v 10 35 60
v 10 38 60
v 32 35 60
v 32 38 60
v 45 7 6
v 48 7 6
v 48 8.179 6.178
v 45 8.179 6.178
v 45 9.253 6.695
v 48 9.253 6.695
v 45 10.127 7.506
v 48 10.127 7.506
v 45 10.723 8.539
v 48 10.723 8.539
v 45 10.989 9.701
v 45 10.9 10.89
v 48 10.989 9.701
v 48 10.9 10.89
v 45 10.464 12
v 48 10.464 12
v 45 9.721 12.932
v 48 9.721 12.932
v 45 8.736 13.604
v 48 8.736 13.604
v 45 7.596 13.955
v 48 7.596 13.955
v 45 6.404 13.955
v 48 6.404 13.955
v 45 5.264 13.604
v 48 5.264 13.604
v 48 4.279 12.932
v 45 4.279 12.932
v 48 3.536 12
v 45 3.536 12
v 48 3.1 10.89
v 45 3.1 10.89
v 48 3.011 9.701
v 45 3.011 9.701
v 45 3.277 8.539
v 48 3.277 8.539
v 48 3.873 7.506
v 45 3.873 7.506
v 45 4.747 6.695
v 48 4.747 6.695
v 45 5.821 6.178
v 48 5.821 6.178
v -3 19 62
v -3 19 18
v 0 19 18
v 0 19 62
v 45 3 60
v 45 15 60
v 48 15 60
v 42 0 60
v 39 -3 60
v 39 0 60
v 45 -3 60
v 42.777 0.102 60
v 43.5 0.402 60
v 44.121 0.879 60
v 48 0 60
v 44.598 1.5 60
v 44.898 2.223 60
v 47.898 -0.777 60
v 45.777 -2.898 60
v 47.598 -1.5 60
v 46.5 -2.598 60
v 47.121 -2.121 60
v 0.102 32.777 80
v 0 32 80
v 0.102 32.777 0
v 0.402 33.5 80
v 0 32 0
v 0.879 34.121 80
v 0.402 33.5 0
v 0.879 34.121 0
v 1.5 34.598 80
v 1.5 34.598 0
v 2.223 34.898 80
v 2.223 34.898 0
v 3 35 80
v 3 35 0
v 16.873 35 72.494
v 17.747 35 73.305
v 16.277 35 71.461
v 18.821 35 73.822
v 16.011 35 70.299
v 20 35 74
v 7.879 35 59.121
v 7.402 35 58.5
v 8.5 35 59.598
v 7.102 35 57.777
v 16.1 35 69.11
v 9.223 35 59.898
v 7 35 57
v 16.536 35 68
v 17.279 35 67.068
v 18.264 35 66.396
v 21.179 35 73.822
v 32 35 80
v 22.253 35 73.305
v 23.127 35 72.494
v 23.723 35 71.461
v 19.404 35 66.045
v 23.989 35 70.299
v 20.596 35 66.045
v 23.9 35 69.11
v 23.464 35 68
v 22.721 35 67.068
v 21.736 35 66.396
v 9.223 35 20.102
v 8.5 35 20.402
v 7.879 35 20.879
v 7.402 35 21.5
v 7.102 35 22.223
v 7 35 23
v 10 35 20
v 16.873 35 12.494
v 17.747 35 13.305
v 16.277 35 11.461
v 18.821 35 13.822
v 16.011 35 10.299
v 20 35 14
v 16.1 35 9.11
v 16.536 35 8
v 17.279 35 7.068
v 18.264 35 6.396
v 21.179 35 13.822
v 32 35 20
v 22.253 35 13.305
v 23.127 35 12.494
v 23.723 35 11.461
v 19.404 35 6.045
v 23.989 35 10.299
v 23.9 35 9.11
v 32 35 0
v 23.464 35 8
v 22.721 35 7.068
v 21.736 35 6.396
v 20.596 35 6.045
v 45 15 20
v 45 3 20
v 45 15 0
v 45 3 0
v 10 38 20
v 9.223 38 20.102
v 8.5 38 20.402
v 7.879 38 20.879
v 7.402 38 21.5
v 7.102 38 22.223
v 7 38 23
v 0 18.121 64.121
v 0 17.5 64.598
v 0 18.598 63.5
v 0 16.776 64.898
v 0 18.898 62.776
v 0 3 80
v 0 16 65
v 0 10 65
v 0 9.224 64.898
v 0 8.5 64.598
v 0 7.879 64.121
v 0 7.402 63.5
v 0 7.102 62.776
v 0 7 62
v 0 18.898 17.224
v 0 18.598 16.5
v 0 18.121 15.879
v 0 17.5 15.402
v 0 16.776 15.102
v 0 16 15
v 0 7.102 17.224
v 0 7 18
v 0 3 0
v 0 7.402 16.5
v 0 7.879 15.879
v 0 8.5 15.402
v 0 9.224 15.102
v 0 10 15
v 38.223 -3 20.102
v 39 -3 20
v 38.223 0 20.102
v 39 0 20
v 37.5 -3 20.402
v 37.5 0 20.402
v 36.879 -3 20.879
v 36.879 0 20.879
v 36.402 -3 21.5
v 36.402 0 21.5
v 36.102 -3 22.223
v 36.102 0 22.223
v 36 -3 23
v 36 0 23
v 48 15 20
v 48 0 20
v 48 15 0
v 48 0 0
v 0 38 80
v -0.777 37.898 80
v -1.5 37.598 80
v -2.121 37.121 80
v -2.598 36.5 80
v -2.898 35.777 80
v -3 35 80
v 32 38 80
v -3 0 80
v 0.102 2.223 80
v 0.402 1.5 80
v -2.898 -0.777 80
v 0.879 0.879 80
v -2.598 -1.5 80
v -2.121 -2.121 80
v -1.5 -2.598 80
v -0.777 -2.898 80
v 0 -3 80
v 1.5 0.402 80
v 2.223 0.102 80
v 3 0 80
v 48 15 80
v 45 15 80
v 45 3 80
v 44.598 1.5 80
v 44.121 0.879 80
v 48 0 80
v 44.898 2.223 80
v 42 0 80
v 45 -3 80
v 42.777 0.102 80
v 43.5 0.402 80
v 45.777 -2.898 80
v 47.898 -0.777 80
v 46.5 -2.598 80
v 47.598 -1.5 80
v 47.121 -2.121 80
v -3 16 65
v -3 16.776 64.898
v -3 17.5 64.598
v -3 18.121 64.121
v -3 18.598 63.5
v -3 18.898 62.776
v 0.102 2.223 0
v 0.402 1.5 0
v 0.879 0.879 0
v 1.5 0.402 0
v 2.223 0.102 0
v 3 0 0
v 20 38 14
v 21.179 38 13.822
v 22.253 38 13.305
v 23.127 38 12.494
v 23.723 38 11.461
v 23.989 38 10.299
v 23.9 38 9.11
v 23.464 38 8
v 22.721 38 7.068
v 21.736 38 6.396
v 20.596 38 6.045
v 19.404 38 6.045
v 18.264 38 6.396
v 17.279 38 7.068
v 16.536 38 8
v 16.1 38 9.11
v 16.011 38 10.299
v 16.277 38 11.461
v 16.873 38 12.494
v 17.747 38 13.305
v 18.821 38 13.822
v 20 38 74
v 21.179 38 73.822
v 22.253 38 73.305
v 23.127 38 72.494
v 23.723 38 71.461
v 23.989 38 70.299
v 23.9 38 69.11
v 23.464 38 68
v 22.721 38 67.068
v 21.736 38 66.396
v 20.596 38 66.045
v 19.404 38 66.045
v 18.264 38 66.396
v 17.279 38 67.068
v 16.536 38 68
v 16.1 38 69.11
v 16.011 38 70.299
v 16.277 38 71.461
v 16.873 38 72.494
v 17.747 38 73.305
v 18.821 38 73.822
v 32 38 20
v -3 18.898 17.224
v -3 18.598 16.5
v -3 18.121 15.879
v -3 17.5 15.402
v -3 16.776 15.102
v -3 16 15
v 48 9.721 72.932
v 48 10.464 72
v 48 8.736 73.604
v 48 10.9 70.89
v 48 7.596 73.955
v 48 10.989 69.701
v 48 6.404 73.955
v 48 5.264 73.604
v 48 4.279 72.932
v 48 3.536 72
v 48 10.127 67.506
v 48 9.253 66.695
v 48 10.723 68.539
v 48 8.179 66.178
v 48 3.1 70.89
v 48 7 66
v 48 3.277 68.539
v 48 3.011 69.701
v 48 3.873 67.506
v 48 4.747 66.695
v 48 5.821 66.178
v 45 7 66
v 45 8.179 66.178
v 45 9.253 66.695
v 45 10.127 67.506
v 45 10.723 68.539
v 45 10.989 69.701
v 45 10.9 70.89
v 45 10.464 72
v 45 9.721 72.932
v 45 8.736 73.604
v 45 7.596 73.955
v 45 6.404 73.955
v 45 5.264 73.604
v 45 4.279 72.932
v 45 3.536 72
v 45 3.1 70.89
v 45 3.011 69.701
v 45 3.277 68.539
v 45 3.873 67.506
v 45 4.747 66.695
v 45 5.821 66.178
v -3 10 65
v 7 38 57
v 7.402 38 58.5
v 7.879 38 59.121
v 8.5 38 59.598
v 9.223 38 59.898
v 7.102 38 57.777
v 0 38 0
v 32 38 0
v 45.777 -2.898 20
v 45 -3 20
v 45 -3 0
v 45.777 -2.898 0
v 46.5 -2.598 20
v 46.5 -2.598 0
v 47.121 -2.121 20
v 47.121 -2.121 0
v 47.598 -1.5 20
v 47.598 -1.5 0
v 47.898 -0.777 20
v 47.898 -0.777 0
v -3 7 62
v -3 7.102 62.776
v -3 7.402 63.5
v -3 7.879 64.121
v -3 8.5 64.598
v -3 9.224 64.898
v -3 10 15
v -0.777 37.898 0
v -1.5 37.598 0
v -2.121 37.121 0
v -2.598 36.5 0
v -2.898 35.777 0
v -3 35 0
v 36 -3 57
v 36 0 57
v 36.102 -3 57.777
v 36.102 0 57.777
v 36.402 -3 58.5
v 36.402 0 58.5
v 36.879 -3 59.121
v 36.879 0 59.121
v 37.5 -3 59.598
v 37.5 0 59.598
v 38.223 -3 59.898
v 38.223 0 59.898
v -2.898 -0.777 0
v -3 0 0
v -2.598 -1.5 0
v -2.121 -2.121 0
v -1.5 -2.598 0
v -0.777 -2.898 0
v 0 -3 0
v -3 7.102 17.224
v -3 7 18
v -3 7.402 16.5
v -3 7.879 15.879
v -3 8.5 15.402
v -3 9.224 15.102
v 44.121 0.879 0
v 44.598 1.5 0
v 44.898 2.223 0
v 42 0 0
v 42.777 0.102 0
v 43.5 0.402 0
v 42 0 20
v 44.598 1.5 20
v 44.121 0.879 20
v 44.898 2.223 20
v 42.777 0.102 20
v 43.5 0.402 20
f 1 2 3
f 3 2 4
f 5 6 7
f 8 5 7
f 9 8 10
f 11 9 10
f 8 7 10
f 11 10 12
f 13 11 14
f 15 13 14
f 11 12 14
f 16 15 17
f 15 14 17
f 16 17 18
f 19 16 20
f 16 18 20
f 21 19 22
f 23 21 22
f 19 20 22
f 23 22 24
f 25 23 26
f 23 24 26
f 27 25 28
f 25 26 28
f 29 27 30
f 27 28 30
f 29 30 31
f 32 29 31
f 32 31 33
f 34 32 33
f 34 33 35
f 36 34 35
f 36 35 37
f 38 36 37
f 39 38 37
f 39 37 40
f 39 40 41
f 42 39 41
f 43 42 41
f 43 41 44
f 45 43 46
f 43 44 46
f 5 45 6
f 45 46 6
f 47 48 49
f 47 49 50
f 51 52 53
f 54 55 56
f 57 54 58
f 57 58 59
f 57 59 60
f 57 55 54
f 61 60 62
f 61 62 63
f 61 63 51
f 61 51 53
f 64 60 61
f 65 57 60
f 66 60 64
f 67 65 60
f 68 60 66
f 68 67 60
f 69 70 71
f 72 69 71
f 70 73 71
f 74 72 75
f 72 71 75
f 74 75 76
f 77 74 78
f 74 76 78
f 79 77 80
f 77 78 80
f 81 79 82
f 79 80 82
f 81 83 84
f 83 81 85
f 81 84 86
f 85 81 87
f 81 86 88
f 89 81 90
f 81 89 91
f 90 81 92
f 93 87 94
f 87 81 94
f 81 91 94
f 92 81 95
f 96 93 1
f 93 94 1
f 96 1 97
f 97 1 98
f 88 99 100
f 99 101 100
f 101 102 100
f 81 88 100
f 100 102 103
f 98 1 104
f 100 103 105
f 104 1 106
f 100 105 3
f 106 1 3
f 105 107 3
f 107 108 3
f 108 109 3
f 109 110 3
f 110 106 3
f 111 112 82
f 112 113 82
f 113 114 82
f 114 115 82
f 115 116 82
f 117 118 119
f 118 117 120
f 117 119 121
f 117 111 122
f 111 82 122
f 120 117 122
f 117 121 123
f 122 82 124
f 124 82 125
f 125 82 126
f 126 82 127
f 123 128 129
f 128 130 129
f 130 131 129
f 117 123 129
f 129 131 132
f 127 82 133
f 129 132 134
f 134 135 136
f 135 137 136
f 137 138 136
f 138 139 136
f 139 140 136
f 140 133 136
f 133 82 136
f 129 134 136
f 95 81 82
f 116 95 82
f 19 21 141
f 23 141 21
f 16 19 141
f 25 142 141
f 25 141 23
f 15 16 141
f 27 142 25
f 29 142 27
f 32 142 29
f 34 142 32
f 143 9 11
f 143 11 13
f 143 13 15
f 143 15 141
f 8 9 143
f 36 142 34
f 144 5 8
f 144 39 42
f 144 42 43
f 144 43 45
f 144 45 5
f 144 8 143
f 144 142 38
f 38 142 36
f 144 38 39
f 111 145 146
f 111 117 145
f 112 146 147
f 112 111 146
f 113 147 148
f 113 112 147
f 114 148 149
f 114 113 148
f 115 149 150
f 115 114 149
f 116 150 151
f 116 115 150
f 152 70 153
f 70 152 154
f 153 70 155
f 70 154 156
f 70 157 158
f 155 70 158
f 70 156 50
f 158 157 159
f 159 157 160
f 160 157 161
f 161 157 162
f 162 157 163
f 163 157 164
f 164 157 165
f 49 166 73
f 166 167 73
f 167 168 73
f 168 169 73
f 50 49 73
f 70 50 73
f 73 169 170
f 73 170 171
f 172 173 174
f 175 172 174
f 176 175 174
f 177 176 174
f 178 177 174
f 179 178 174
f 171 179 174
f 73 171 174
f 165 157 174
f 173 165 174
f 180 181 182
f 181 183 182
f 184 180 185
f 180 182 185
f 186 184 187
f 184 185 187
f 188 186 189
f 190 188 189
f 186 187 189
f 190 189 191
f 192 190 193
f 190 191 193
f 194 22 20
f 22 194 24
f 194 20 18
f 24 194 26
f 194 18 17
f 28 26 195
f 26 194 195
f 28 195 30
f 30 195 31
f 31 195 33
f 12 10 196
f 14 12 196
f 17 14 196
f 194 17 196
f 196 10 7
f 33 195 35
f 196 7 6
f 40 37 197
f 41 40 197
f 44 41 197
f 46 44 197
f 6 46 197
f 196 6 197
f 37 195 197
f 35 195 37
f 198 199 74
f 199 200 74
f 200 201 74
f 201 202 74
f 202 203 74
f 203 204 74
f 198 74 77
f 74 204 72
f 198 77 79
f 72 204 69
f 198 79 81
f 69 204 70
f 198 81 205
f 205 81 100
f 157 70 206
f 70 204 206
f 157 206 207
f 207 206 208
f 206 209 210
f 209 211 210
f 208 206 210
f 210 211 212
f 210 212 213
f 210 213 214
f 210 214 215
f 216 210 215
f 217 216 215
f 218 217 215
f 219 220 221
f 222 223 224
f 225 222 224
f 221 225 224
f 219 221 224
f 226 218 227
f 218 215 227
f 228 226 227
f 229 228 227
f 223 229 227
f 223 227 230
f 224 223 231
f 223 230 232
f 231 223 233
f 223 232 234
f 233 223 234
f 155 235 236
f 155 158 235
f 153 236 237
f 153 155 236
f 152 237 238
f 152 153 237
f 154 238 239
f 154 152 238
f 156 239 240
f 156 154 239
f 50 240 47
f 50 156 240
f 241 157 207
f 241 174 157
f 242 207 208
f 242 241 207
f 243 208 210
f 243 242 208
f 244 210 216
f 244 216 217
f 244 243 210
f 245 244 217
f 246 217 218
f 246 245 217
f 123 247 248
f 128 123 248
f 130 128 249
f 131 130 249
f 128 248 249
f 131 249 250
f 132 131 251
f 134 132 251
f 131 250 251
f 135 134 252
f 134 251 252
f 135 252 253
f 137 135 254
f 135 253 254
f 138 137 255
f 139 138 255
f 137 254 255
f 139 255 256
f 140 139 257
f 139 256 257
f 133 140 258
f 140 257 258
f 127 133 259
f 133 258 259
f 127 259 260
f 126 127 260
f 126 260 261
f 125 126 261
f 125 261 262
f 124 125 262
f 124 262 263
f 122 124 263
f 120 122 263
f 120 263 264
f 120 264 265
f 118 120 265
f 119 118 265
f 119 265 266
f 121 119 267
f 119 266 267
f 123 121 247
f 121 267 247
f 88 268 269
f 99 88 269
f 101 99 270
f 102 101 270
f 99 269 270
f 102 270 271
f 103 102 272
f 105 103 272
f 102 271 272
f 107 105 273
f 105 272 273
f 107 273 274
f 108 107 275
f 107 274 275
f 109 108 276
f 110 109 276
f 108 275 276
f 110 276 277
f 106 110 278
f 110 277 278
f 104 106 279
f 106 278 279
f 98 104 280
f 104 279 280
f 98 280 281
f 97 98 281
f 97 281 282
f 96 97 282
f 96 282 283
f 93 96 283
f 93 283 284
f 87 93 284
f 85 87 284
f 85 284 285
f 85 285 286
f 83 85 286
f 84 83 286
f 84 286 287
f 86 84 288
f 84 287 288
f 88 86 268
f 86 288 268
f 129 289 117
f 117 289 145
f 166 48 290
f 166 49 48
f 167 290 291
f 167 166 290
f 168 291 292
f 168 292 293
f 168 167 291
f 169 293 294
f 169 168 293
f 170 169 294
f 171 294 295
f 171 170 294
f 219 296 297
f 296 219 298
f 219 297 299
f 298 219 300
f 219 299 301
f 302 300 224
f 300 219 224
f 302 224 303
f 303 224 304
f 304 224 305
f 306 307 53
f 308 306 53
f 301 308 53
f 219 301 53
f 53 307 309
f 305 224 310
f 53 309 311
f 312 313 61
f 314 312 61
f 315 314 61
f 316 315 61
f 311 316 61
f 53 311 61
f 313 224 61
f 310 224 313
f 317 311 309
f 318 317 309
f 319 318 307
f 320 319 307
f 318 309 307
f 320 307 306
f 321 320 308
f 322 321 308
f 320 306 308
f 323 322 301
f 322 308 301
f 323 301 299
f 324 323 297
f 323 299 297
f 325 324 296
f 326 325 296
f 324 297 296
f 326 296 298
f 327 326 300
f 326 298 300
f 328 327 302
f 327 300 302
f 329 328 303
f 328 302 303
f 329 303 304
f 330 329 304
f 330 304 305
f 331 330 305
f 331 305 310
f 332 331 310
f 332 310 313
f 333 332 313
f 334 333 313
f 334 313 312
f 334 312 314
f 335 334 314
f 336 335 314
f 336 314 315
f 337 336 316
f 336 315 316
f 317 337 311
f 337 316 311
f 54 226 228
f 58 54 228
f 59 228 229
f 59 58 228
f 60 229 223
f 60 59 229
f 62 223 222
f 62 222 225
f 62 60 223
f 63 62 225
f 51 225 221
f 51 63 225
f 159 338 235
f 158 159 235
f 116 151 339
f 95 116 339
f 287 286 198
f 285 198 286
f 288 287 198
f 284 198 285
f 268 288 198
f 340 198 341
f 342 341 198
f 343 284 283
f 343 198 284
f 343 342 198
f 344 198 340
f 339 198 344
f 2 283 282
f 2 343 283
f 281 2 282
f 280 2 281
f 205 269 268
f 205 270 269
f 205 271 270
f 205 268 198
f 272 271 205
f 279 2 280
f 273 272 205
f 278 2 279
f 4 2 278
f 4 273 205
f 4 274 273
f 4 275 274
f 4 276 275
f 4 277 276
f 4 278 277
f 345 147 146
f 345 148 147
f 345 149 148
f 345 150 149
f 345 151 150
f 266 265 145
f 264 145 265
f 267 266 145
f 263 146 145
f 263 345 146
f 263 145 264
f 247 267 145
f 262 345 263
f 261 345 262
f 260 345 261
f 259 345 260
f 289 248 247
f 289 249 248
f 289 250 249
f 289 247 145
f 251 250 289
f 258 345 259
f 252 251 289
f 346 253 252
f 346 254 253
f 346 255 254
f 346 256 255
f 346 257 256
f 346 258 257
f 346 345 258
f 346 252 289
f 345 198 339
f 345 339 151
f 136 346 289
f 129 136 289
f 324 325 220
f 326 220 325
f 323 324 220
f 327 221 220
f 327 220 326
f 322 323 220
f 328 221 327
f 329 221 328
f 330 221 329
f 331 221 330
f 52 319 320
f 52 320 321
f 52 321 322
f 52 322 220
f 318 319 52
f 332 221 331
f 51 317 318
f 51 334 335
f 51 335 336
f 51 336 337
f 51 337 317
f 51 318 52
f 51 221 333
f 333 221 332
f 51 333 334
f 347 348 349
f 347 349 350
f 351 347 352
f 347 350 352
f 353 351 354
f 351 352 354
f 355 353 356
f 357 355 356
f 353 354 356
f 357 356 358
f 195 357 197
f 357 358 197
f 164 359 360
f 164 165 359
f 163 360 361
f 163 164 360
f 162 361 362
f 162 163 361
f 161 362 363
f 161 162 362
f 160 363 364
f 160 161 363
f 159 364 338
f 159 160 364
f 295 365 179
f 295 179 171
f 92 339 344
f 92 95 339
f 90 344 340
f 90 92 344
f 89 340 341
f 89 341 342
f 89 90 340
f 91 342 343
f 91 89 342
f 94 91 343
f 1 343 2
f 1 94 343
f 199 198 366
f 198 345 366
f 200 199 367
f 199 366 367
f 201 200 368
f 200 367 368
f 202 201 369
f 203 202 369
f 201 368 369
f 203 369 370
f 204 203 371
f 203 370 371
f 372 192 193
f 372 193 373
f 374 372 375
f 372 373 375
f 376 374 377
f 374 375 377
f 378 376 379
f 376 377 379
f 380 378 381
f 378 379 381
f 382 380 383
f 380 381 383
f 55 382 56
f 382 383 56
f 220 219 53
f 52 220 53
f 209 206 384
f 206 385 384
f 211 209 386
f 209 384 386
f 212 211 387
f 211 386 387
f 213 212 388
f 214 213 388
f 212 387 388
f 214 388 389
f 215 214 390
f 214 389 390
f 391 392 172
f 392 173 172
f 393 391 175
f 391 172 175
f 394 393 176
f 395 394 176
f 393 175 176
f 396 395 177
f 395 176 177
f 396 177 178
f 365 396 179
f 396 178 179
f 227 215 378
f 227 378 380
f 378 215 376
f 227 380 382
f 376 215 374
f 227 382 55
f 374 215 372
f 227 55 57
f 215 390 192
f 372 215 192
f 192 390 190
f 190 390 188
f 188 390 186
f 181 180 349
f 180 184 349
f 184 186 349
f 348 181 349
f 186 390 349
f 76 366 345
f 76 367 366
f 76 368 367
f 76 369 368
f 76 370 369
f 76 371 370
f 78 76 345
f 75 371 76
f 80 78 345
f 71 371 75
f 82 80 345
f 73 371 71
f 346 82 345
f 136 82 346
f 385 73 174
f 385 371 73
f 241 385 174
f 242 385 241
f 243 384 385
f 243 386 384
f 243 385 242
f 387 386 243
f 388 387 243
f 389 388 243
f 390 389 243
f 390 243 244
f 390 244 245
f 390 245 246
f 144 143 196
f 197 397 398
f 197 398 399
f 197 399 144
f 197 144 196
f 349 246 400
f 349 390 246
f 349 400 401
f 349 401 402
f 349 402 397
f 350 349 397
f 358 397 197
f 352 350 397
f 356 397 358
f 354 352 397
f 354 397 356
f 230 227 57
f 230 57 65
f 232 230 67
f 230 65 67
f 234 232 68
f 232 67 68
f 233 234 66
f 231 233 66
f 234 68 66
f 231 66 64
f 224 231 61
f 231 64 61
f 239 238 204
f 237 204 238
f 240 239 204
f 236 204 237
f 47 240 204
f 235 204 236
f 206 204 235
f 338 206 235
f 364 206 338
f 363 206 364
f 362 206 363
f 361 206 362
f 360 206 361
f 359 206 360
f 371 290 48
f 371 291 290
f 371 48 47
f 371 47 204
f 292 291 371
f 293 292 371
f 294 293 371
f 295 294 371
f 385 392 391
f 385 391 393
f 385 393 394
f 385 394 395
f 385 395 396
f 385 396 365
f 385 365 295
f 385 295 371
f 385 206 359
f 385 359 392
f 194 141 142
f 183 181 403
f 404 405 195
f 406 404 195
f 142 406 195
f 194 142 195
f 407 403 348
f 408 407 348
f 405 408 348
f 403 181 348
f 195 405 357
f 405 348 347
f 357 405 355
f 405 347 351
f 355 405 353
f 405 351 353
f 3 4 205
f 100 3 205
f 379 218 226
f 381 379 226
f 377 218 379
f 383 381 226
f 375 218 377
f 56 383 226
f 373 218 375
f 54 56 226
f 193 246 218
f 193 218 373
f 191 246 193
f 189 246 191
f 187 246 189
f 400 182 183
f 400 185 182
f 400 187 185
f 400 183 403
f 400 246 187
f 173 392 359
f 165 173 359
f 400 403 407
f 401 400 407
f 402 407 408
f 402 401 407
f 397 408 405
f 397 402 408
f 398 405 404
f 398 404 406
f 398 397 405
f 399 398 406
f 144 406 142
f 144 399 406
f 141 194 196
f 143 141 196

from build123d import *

# Parameters (mm, degrees)
SKETCH2_W           = 45
SKETCH2_H           = 80
BOSS_EXTRUDE2_DEPTH = 35
SHELL2_T            = 3
SKETCH5_R           = 4
CUT_EXTRUDE1_DEPTH  = 3
SKETCH6_R           = 4
CUT_EXTRUDE2_DEPTH  = 3
SKETCH7_W           = 12
SKETCH7_H           = 40
CUT_EXTRUDE3_DEPTH  = 3
SKETCH8_W           = 50
SKETCH8_H           = 12
CUT_EXTRUDE4_DEPTH  = 3
FILLET1_R           = 3
FILLET2_R           = 3


with BuildPart() as part:
    # Sketch2 → Boss-Extrude2 (new body)
    with BuildSketch(Plane(origin=(0, 0, 0), x_dir=(1, 0, 0), z_dir=(0, 1, 0))):
        with Locations((22.5, -40)):
            Rectangle(SKETCH2_W, SKETCH2_H)
    extrude(amount=BOSS_EXTRUDE2_DEPTH)

    # Shell2
    shell2_openings = [part.faces().sort_by_distance(p)[0] for p in [
        (22.5, 17.5, 0),
        (22.5, 17.5, 80),
    ]]
    offset(amount=SHELL2_T, openings=shell2_openings, kind=Kind.INTERSECTION)

    # Sketch5 → Cut-Extrude1 (cut)
    with BuildSketch(Plane(origin=(0, 38, 0), x_dir=(1, 0, 0), z_dir=(0, 1, 0))):
        with Locations(Location((20, -70, 0), (0, 0, 270))):
            Circle(SKETCH5_R)
        with Locations(Location((20, -10, 0), (0, 0, 270))):
            Circle(SKETCH5_R)
        Polygon((32, 0), (32, -20), (7, -20), (7, -60), (32, -60), (32, -80), (48, -80), (48, 0), align=None)
    extrude(amount=-CUT_EXTRUDE1_DEPTH, mode=Mode.SUBTRACT)

    # Sketch6 → Cut-Extrude2 (cut)
    with BuildSketch(Plane(origin=(48, 0, 0), x_dir=(0, 0, -1), z_dir=(1, 0, 0))):
        with Locations((-70, 7)):
            Circle(SKETCH6_R)
        with Locations((-10, 7)):
            Circle(SKETCH6_R)
        Polygon((-80, 15), (-60, 15), (-60, -3), (-20, -3), (-20, 15), (0, 15), (0, 35), (-80, 35), align=None)
    extrude(amount=-CUT_EXTRUDE2_DEPTH, mode=Mode.SUBTRACT)

    # Sketch7 → Cut-Extrude3 (cut)
    with BuildSketch(Plane.XZ.offset(3)):
        with Locations((42, 40)):
            Rectangle(SKETCH7_W, SKETCH7_H)
    extrude(amount=-CUT_EXTRUDE3_DEPTH, mode=Mode.SUBTRACT)

    # Sketch8 → Cut-Extrude4 (cut)
    with BuildSketch(Plane.ZY.offset(3)):
        with Locations((40, 13)):
            Rectangle(SKETCH8_W, SKETCH8_H)
    extrude(amount=-CUT_EXTRUDE4_DEPTH, mode=Mode.SUBTRACT)

    # Fillet1
    fillet1_edges = [part.edges().sort_by_distance(p)[0] for p in [
        (36, -1.5, 60),
        (36, -1.5, 20),
        (0, 0, 40),
        (45, 0, 70),
        (0, 35, 40),
        (7, 36.5, 60),
        (7, 36.5, 20),
        (-3, 38, 40),
        (48, -3, 70),
        (-3, -3, 40),
        (45, 0, 10),
        (48, -3, 10),
    ]]
    fillet(fillet1_edges, radius=FILLET1_R - 0.0001)  # a hair under: the kernel refuses the full size

    # Fillet2
    fillet2_edges = [part.edges().sort_by_distance(p)[0] for p in [
        (-1.5, 7, 65),
        (-1.5, 19, 65),
        (-1.5, 19, 15),
        (-1.5, 7, 15),
    ]]
    fillet(fillet2_edges, radius=FILLET2_R)


solid = part.part
